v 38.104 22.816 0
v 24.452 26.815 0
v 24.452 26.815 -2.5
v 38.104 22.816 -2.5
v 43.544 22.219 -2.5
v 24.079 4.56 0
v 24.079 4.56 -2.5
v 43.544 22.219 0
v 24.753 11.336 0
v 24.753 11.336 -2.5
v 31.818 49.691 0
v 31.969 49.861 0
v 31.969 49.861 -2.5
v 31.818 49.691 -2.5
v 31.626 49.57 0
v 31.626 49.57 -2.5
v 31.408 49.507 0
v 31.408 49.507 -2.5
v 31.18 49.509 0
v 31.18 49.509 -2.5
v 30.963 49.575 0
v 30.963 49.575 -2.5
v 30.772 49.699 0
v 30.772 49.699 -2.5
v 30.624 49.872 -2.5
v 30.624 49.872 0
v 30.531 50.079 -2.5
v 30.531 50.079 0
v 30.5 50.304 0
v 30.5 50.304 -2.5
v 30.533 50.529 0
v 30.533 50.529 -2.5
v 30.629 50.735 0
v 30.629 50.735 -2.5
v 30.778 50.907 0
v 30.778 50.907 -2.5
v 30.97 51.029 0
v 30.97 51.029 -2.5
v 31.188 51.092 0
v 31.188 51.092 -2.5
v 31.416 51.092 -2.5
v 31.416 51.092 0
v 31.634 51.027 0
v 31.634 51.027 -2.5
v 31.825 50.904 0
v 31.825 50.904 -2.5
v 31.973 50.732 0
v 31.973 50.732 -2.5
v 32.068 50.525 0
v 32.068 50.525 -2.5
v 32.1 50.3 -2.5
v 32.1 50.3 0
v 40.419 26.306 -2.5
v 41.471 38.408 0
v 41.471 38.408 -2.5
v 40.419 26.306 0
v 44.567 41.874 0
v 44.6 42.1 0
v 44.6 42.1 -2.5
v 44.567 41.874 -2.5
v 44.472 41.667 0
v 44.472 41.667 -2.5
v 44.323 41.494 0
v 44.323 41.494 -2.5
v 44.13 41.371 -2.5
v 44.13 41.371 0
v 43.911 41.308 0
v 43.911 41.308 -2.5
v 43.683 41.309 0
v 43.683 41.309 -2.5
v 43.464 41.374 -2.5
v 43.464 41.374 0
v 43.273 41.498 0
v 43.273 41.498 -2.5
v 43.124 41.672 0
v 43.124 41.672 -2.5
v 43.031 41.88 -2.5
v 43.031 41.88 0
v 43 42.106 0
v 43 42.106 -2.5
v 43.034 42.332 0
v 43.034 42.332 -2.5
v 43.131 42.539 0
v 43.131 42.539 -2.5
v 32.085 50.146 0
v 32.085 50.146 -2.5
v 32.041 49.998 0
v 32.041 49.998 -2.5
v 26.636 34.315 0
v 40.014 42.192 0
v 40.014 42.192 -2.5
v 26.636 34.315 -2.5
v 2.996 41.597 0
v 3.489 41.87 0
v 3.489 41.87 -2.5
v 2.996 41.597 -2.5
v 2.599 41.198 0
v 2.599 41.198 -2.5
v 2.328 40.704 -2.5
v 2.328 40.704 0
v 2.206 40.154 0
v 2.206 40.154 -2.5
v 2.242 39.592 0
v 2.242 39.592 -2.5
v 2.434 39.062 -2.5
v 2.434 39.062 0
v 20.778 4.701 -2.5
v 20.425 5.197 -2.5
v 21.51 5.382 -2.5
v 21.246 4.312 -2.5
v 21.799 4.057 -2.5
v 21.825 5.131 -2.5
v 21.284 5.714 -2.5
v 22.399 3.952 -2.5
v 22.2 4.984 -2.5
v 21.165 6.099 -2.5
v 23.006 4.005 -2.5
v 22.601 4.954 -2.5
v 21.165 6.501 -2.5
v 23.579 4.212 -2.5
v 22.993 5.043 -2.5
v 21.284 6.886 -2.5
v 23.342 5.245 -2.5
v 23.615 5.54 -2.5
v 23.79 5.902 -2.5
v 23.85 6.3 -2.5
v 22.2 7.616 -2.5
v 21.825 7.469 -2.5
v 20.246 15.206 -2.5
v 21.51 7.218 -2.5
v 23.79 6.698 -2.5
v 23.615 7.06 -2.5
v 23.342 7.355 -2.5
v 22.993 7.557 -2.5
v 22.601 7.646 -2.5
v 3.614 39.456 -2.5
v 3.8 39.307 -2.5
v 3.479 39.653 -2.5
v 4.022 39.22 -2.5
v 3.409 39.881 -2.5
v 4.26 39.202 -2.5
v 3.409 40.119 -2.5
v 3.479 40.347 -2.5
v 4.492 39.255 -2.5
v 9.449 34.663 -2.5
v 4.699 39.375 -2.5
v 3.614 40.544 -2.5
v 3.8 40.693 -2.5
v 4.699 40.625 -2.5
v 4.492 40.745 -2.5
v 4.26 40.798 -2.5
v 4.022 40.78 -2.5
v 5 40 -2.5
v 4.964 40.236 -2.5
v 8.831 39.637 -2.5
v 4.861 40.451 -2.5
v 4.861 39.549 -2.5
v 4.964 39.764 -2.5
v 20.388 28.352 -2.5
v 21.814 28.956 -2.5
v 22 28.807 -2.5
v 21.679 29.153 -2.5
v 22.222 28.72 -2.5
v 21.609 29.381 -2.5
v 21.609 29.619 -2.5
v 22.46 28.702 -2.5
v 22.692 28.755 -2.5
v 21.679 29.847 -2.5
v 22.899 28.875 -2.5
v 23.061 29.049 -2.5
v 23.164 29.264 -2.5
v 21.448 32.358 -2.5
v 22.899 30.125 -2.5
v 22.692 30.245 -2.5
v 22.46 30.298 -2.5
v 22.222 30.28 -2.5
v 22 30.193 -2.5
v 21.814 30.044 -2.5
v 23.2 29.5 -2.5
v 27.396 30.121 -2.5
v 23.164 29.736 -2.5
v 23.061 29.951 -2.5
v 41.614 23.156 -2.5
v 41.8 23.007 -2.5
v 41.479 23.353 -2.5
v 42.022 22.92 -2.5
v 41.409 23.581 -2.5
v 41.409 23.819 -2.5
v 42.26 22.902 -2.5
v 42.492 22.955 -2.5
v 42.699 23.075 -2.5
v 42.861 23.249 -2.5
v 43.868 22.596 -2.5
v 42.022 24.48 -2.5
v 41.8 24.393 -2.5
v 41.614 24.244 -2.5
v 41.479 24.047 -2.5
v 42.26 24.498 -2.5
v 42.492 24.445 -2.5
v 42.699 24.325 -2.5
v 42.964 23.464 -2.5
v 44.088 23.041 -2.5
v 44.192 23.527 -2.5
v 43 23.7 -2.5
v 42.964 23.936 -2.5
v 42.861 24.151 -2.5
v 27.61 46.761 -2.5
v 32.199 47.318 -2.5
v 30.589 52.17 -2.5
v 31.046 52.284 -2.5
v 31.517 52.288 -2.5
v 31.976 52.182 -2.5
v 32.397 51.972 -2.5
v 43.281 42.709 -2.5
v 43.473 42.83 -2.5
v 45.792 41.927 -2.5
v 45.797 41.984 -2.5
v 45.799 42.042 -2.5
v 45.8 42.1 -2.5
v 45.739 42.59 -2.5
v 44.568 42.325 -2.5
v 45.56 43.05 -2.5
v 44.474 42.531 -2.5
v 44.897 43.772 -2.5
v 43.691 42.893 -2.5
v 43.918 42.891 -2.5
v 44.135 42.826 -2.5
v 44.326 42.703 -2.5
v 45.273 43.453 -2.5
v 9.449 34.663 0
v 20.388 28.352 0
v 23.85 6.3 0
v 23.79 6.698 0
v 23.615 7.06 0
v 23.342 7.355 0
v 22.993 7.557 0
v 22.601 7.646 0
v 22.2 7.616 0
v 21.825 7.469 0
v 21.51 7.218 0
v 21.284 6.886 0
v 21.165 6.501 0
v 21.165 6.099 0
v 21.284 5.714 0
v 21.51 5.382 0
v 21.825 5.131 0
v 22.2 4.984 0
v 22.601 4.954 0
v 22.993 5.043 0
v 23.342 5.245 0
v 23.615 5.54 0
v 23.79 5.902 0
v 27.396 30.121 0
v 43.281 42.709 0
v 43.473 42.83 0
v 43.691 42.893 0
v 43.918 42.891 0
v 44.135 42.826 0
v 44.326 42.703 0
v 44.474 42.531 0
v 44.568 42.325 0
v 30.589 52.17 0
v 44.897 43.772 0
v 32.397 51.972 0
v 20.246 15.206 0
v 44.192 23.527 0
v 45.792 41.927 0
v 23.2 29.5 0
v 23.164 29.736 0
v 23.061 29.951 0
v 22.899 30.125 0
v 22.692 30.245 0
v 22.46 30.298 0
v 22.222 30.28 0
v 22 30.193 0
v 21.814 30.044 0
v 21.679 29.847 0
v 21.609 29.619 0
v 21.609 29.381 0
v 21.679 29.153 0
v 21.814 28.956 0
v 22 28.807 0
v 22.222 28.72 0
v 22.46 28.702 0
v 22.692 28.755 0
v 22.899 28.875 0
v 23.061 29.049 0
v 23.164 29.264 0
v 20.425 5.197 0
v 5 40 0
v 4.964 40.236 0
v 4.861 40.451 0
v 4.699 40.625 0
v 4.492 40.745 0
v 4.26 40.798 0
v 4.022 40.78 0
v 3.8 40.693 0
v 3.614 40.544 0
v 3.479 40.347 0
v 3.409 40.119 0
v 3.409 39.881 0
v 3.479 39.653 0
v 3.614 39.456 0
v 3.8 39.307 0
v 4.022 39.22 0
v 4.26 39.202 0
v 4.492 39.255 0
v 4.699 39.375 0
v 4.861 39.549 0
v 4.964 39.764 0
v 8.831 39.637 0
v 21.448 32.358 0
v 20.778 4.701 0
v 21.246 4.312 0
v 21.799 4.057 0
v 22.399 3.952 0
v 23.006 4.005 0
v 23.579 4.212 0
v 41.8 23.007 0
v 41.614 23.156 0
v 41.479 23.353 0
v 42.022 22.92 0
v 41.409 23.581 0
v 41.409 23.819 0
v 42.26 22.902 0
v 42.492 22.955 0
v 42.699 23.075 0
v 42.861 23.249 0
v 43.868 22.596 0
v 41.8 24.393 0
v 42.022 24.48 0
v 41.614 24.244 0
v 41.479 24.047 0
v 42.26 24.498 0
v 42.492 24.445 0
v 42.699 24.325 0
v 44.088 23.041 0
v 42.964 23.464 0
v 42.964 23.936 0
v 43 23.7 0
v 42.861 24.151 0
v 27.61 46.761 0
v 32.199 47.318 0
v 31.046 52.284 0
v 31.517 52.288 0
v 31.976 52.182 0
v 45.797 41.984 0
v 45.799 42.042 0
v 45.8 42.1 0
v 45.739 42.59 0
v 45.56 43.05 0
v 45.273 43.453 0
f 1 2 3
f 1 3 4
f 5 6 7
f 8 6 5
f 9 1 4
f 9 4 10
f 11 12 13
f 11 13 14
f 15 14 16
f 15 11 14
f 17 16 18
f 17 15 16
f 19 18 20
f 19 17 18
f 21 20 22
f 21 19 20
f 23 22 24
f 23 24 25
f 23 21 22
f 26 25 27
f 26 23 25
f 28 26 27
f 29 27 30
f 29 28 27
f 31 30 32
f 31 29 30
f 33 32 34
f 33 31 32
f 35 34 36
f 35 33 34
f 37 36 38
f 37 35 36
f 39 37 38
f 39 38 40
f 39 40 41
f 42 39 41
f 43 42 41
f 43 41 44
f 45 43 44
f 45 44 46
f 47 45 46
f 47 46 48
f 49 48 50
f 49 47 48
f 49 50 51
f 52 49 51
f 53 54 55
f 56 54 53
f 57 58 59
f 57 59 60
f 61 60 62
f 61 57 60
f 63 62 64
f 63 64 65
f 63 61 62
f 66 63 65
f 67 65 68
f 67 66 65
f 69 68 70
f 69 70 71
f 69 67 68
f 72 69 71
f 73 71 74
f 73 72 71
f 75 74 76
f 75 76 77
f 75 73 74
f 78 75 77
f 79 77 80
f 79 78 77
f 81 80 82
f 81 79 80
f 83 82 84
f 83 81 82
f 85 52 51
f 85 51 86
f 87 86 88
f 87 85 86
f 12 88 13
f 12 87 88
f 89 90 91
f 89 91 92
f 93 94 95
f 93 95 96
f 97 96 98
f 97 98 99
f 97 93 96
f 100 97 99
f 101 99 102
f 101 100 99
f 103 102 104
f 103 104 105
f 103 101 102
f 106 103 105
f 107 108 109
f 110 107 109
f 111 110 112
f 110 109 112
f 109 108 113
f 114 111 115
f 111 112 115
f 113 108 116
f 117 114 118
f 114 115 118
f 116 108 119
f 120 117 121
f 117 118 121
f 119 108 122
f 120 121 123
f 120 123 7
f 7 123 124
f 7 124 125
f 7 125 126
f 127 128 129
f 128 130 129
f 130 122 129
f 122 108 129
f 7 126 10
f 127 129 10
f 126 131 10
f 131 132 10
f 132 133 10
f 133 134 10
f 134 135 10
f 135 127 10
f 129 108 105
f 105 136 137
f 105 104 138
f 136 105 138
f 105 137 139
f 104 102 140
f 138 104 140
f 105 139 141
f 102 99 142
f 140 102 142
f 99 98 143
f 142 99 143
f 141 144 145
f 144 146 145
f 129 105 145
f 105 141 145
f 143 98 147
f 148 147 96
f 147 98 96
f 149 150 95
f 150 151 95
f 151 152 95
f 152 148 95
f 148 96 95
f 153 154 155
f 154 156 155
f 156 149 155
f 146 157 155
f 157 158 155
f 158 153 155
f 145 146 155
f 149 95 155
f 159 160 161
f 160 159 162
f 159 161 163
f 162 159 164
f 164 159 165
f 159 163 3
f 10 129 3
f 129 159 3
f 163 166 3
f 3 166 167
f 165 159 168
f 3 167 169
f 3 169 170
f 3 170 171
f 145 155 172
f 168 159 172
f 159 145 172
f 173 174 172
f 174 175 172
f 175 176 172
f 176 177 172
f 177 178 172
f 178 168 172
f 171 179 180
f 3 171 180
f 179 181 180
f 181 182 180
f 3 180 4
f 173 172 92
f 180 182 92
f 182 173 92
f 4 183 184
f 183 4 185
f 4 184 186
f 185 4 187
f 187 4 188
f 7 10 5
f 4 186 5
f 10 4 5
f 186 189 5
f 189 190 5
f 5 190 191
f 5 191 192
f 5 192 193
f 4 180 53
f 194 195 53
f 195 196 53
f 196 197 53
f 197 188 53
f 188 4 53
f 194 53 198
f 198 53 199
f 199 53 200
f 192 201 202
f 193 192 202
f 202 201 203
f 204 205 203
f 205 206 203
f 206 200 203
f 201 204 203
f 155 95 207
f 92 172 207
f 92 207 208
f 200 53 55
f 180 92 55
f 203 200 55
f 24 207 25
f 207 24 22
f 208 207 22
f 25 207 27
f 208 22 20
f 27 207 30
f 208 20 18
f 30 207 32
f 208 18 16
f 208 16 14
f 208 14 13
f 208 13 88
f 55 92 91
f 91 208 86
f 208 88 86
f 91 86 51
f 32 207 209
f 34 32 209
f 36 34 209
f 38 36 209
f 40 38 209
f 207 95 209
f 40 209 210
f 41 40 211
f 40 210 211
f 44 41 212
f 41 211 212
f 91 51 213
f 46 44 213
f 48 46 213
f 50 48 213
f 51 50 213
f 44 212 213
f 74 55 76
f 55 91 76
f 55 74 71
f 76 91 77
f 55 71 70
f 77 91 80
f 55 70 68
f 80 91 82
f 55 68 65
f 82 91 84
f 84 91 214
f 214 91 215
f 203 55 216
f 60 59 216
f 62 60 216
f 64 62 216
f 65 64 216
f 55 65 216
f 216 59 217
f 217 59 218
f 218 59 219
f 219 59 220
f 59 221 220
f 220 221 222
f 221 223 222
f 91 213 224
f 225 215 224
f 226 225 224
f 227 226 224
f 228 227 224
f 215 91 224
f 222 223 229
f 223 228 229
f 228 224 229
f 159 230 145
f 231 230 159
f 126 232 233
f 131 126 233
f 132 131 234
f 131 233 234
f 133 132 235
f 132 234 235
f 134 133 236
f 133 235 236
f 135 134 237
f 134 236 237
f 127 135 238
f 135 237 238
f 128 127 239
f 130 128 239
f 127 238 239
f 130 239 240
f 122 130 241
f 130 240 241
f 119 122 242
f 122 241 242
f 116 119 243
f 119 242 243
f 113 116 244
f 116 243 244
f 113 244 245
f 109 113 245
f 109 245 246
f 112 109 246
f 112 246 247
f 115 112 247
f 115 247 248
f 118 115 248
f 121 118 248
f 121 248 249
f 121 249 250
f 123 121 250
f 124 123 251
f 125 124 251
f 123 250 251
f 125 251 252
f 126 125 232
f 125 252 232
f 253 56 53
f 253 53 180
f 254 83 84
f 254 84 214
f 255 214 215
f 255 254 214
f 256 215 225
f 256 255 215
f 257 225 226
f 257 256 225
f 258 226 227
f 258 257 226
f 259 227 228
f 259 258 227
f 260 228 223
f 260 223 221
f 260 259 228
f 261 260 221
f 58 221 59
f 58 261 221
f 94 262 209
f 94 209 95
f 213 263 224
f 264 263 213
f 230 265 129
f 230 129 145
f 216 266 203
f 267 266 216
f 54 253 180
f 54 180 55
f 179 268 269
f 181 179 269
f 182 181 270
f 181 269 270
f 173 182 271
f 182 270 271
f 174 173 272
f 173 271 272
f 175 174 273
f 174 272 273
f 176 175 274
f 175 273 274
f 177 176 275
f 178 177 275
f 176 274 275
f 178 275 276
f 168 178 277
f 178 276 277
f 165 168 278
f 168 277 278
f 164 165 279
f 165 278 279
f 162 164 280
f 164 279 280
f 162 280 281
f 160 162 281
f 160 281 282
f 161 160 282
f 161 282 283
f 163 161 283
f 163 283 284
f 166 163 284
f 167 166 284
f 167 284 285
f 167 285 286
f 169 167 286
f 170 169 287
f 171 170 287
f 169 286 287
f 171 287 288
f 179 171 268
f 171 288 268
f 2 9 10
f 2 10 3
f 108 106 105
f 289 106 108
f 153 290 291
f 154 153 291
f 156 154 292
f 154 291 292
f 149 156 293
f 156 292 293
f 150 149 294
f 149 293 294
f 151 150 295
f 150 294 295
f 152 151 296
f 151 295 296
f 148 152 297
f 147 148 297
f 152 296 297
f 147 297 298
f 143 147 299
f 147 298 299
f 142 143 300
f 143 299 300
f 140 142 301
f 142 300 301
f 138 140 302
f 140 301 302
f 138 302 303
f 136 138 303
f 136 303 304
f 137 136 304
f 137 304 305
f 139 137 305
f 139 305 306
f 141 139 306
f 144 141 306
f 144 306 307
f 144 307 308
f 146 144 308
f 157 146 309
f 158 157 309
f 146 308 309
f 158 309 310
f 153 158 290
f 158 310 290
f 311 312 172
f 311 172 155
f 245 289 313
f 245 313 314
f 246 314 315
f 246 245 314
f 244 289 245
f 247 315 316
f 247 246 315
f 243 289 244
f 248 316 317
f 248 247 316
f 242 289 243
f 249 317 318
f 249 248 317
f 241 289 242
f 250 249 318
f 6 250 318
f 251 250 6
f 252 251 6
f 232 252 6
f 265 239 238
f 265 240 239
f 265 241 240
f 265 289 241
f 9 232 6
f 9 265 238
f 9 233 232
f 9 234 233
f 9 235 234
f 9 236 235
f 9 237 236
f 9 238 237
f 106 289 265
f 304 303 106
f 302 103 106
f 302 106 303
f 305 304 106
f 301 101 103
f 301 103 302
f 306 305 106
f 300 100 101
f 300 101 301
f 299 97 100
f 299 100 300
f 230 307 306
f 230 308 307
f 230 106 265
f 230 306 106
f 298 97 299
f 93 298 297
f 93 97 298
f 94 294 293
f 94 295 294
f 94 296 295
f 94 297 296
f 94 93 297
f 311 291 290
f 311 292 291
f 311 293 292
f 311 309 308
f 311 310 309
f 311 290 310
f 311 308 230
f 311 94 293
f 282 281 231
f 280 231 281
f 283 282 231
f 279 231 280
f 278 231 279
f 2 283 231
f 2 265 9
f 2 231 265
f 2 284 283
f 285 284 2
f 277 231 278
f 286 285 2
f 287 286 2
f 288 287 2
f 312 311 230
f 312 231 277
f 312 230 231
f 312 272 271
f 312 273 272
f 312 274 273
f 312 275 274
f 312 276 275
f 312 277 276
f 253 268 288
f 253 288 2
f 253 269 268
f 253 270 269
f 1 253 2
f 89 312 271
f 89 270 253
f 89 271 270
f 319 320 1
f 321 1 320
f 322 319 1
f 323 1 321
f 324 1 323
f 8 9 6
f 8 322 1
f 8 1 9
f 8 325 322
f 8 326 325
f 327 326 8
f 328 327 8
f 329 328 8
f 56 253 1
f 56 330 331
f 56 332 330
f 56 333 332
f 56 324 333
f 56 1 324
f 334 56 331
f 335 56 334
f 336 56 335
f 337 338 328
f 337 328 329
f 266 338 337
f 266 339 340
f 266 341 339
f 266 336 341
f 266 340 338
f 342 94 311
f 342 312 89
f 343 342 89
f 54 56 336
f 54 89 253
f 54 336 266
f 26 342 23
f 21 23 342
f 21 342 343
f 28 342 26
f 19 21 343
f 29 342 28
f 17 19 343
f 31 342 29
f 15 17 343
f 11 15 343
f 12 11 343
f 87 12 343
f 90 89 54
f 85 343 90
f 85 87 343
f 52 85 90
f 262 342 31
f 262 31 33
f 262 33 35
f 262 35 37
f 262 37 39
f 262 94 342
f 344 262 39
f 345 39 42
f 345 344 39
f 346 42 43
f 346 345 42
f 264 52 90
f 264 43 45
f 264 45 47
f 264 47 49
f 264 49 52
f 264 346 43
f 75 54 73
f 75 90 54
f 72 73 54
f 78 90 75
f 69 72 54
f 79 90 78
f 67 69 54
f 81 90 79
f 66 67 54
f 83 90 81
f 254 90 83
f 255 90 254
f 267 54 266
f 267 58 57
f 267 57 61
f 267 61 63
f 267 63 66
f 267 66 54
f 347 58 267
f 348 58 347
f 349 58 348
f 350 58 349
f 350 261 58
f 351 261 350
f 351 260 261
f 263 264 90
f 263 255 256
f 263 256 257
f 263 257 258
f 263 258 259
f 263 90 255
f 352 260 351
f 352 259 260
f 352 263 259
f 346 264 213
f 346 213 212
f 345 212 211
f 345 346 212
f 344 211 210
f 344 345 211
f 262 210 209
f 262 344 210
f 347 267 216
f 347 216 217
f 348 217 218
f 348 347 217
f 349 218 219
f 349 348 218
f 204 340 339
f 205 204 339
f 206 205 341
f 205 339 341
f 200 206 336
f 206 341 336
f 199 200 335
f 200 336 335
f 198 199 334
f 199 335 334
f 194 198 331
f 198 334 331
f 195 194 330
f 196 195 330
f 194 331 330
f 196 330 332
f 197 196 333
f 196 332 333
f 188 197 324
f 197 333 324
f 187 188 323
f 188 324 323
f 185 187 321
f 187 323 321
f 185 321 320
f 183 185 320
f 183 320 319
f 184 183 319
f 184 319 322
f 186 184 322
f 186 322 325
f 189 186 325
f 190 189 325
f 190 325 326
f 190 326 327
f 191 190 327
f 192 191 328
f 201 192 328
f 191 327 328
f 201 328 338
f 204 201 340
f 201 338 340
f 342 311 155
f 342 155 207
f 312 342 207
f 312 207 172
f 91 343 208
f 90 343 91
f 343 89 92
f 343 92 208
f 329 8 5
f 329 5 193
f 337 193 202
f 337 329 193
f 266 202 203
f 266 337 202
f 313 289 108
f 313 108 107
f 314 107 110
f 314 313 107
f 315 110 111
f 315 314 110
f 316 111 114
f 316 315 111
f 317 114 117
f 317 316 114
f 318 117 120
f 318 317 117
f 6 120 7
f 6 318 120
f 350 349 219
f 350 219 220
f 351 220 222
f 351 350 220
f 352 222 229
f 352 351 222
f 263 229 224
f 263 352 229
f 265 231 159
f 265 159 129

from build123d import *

# Parameters (mm, degrees)
F1_R     = 0.8
F1_R_2   = 1.35
F2_DEPTH = 2.5


# Not quite as in the source:
# - a feature of the source that left no trace in its solid (it failed there, or was rolled back) is left out


with BuildPart() as f2:
    # F1 (on Top) → F2 (new body)
    with BuildSketch(Plane.XY):
        with BuildLine():
            ThreePointArc((5.199444907, 41.7323711721), (4.3598959993, 41.9935980712), (3.4894439174, 41.8695213434))
            ThreePointArc((3.4894439174, 41.8695213434), (2.3279381226, 40.7038354404), (2.4337804668, 39.0616671377))
            ThreePointArc((2.4337804668, 39.0616671377), (2.7613029651, 38.610701313), (3.200555093, 38.2676288279))
            ThreePointArc((3.200555093, 38.2676288279), (4.1741960688, 38.0001664676), (5.1544139045, 38.2424181103))
            ThreePointArc((5.1544139045, 38.2424181103), (5.9188408607, 38.9774609565), (6.2, 40))
            ThreePointArc((6.2, 40), (6.1361812507, 40.5012007226), (5.9487978357, 40.9704154419))
            ThreePointArc((5.9487978357, 40.9704154419), (5.625957109, 41.402371678), (5.199444907, 41.7323711721))
        make_face()
        with Locations((4.2, 40)):
            Circle(F1_R, mode=Mode.SUBTRACT)
        with BuildLine():
            Line((27.6104340169, 46.7612620152), (29.4612530015, 51.0867715523))
            ThreePointArc((29.4612530015, 51.0867715523), (29.9151450158, 51.7429749383), (30.5894439174, 52.1695213434))
            Line((30.5894439174, 52.1695213434), (3.4894439174, 41.8695213434))
            ThreePointArc((3.4894439174, 41.8695213434), (4.3598959993, 41.9935980712), (5.199444907, 41.7323711721))
            Line((5.199444907, 41.7323711721), (8.8310911779, 39.6371906312))
            Line((8.8310911779, 39.6371906312), (27.6104340169, 46.7612620152))
        make_face()
        with BuildLine():
            ThreePointArc((32.009384409, 48.4300337542), (32.5519790638, 48.74033708), (32.972287567, 49.202979356))
            ThreePointArc((32.972287567, 49.202979356), (33.0623576694, 49.3544337965), (33.1387469985, 49.5132284477))
            ThreePointArc((33.1387469985, 49.5132284477), (33.2592720583, 49.8984368026), (33.3, 50.3))
            ThreePointArc((33.3, 50.3), (33.0598354025, 51.2502522592), (32.397020644, 51.972287567))
            ThreePointArc((32.397020644, 51.972287567), (31.5169424001, 52.2881991839), (30.5894439174, 52.1695213434))
            ThreePointArc((30.5894439174, 52.1695213434), (29.9151450158, 51.7429749383), (29.4612530015, 51.0867715523))
            ThreePointArc((29.4612530015, 51.0867715523), (29.3852086666, 49.7224412157), (30.202979356, 48.627712433))
            ThreePointArc((30.202979356, 48.627712433), (31.0824346588, 48.311868887), (32.009384409, 48.4300337542))
        make_face()
        with BuildLine():
            ThreePointArc((31.9689150268, 49.8611917424), (30.5334714547, 50.5289846922), (32.1, 50.3))
            ThreePointArc((32.1, 50.3), (32.0665285453, 50.0710153078), (31.9689150268, 49.8611917424))
        make_face(mode=Mode.SUBTRACT)
        with BuildLine():
            ThreePointArc((20.1501364504, 6.325323864), (20.2166788322, 5.7441722888), (20.4246920484, 5.1974588868))
            ThreePointArc((20.4246920484, 5.1974588868), (22.0958795292, 3.985008284), (24.0790139172, 4.5595359673))
            ThreePointArc((24.0790139172, 4.5595359673), (24.6486254566, 5.3482076659), (24.85, 6.3))
            ThreePointArc((24.85, 6.3), (24.8498894798, 6.3227910674), (24.8495579296, 6.3455799911))
            ThreePointArc((24.8495579296, 6.3455799911), (24.7691945263, 6.9109469713), (24.5548374569, 7.4402381443))
            ThreePointArc((24.5548374569, 7.4402381443), (22.9138153936, 8.6132783706), (20.9678942394, 8.0818956025))
            ThreePointArc((20.9678942394, 8.0818956025), (20.3695522772, 7.2918127346), (20.1501364504, 6.325323864))
        make_face()
        with Locations((22.5, 6.3)):
            Circle(F1_R_2, mode=Mode.SUBTRACT)
        with BuildLine():
            ThreePointArc((44.2, 23.7), (43.800697674, 24.8990692042), (42.7622330434, 25.6193472862))
            ThreePointArc((42.7622330434, 25.6193472862), (41.7779870797, 25.6549693336), (40.8960802037, 25.2165068958))
            ThreePointArc((40.8960802037, 25.2165068958), (40.4202125368, 24.6123357857), (40.2075188236, 23.8732592327))
            ThreePointArc((40.2075188236, 23.8732592327), (40.548821119, 22.571457443), (41.6377669566, 21.7806527138))
            ThreePointArc((41.6377669566, 21.7806527138), (42.6480080175, 21.7508235544), (43.5438416317, 22.2187540147))
            ThreePointArc((43.5438416317, 22.2187540147), (43.991778392, 22.8114448842), (44.1924811764, 23.5267407673))
            ThreePointArc((44.1924811764, 23.5267407673), (44.1981194099, 23.6132888496), (44.2, 23.7))
        make_face()
        with Locations((42.2, 23.7)):
            Circle(F1_R, mode=Mode.SUBTRACT)
        with BuildLine():
            ThreePointArc((42.7852559244, 43.8234542237), (42.4204567714, 43.5480540323), (42.127712433, 43.197020644))
            ThreePointArc((42.127712433, 43.197020644), (41.9102999519, 42.7550066627), (41.8075188236, 42.2732592327))
            ThreePointArc((41.8075188236, 42.2732592327), (42.0006206287, 41.2269399345), (42.702979356, 40.427712433))
            ThreePointArc((42.702979356, 40.427712433), (43.7515555461, 40.1005868024), (44.8147440756, 40.3765457763))
            ThreePointArc((44.8147440756, 40.3765457763), (45.4916344335, 41.0330543859), (45.7924811764, 41.9267407673))
            ThreePointArc((45.7924811764, 41.9267407673), (45.7981194099, 42.0132888496), (45.8, 42.1))
            ThreePointArc((45.8, 42.1), (45.5598354025, 43.0502522592), (44.897020644, 43.772287567))
            ThreePointArc((44.897020644, 43.772287567), (43.8484444539, 44.0994131976), (42.7852559244, 43.8234542237))
        make_face()
        with BuildLine():
            ThreePointArc((44.6, 42.1), (43.5710153078, 41.3334714547), (43.1310849732, 42.5388082576))
            ThreePointArc((43.1310849732, 42.5388082576), (44.0289846922, 42.8665285453), (44.6, 42.1))
        make_face(mode=Mode.SUBTRACT)
        with BuildLine():
            ThreePointArc((22.9622330434, 31.4193472862), (22.1534536929, 31.4847455551), (21.3852559244, 31.2234542237))
            ThreePointArc((21.3852559244, 31.2234542237), (20.8983520938, 30.8210047561), (20.5612530015, 30.2867715523))
            ThreePointArc((20.5612530015, 30.2867715523), (20.4429200591, 29.9121141894), (20.400116128, 29.5215522247))
            ThreePointArc((20.400116128, 29.5215522247), (20.6627449521, 28.5090686712), (21.400555093, 27.7676288279))
            ThreePointArc((21.400555093, 27.7676288279), (21.6135843834, 27.6611007428), (21.8377669566, 27.5806527138))
            ThreePointArc((21.8377669566, 27.5806527138), (22.6465463071, 27.5152544449), (23.4147440756, 27.7765457763))
            ThreePointArc((23.4147440756, 27.7765457763), (23.9016479062, 28.1789952439), (24.2387469985, 28.7132284477))
            ThreePointArc((24.2387469985, 28.7132284477), (24.3592720583, 29.0984368026), (24.4, 29.5))
            ThreePointArc((24.4, 29.5), (24.3999059403, 29.5193966531), (24.3996237698, 29.5387914818))
            ThreePointArc((24.3996237698, 29.5387914818), (24.1221080901, 30.5170269053), (23.399444907, 31.2323711721))
            ThreePointArc((23.399444907, 31.2323711721), (23.1864156166, 31.3388992572), (22.9622330434, 31.4193472862))
        make_face()
        with Locations((22.4, 29.5)):
            Circle(F1_R, mode=Mode.SUBTRACT)
        with BuildLine():
            Line((41.6377669566, 21.7806527138), (38.1039741935, 22.8158041293))
            Line((38.1039741935, 22.8158041293), (24.7527433965, 11.336176711))
            Line((24.7527433965, 11.336176711), (24.8495579296, 6.3455799911))
            ThreePointArc((24.8495579296, 6.3455799911), (24.8498894798, 6.3227910674), (24.85, 6.3))
            ThreePointArc((24.85, 6.3), (24.6486254566, 5.3482076659), (24.0790139172, 4.5595359673))
            Line((24.0790139172, 4.5595359673), (43.5438416317, 22.2187540147))
            ThreePointArc((43.5438416317, 22.2187540147), (42.6480080175, 21.7508235544), (41.6377669566, 21.7806527138))
        make_face()
        with BuildLine():
            Line((44.8147440756, 40.3765457763), (41.4714130157, 38.408042442))
            Line((41.4714130157, 38.408042442), (40.4190386777, 26.3057375549))
            Line((40.4190386777, 26.3057375549), (42.7622330434, 25.6193472862))
            ThreePointArc((42.7622330434, 25.6193472862), (43.800697674, 24.8990692042), (44.2, 23.7))
            ThreePointArc((44.2, 23.7), (44.1981194099, 23.6132888496), (44.1924811764, 23.5267407673))
            Line((44.1924811764, 23.5267407673), (45.7924811764, 41.9267407673))
            ThreePointArc((45.7924811764, 41.9267407673), (45.4916344335, 41.0330543859), (44.8147440756, 40.3765457763))
        make_face()
        with BuildLine():
            Line((24.8495579296, 6.3455799911), (24.7527433965, 11.336176711))
            Line((24.7527433965, 11.336176711), (23.1551857529, 9.9625680299))
            Line((23.1551857529, 9.9625680299), (24.5548374569, 7.4402381443))
            ThreePointArc((24.5548374569, 7.4402381443), (24.7691945263, 6.9109469713), (24.8495579296, 6.3455799911))
        make_face()
        with BuildLine():
            Line((24.5548374569, 7.4402381443), (23.1551857529, 9.9625680299))
            Line((23.1551857529, 9.9625680299), (20.9678942394, 8.0818956025))
            ThreePointArc((20.9678942394, 8.0818956025), (22.9138153936, 8.6132783706), (24.5548374569, 7.4402381443))
        make_face()
        with BuildLine():
            Line((40.2075188236, 23.8732592327), (40.2781200828, 24.6851737134))
            Line((40.2781200828, 24.6851737134), (38.1039741935, 22.8158041293))
            Line((38.1039741935, 22.8158041293), (41.6377669566, 21.7806527138))
            ThreePointArc((41.6377669566, 21.7806527138), (40.548821119, 22.571457443), (40.2075188236, 23.8732592327))
        make_face()
        with BuildLine():
            Line((42.7622330434, 25.6193472862), (40.4190386777, 26.3057375549))
            Line((40.4190386777, 26.3057375549), (40.2781200828, 24.6851737134))
            Line((40.2781200828, 24.6851737134), (40.8960802037, 25.2165068958))
            ThreePointArc((40.8960802037, 25.2165068958), (41.7779870797, 25.6549693336), (42.7622330434, 25.6193472862))
        make_face()
        with BuildLine():
            Line((42.702979356, 40.427712433), (41.7040205766, 41.0830293923))
            Line((41.7040205766, 41.0830293923), (41.4714130157, 38.408042442))
            Line((41.4714130157, 38.408042442), (44.8147440756, 40.3765457763))
            ThreePointArc((44.8147440756, 40.3765457763), (43.7515555461, 40.1005868024), (42.702979356, 40.427712433))
        make_face()
        with BuildLine():
            ThreePointArc((42.702979356, 40.427712433), (42.0006206287, 41.2269399345), (41.8075188236, 42.2732592327))
            Line((41.8075188236, 42.2732592327), (41.7040205766, 41.0830293923))
            Line((41.7040205766, 41.0830293923), (42.702979356, 40.427712433))
        make_face()
        with BuildLine():
            Line((40.8960802037, 25.2165068958), (40.2781200828, 24.6851737134))
            Line((40.2781200828, 24.6851737134), (40.2075188236, 23.8732592327))
            ThreePointArc((40.2075188236, 23.8732592327), (40.4202125368, 24.6123357857), (40.8960802037, 25.2165068958))
        make_face()
        with BuildLine():
            ThreePointArc((3.200555093, 38.2676288279), (2.7613029651, 38.610701313), (2.4337804668, 39.0616671377))
            Line((2.4337804668, 39.0616671377), (20.4246920484, 5.1974588868))
            ThreePointArc((20.4246920484, 5.1974588868), (20.2166788322, 5.7441722888), (20.1501364504, 6.325323864))
            Line((20.1501364504, 6.325323864), (20.2458362488, 15.2055432508))
            Line((20.2458362488, 15.2055432508), (9.4489187614, 34.6628036346))
            Line((9.4489187614, 34.6628036346), (3.200555093, 38.2676288279))
        make_face()
        with BuildLine():
            Line((23.1551857529, 9.9625680299), (20.2458362488, 15.2055432508))
            Line((20.2458362488, 15.2055432508), (20.1501364504, 6.325323864))
            ThreePointArc((20.1501364504, 6.325323864), (20.3695522772, 7.2918127346), (20.9678942394, 8.0818956025))
            Line((20.9678942394, 8.0818956025), (23.1551857529, 9.9625680299))
        make_face()
        with BuildLine():
            Line((24.7527433965, 11.336176711), (24.452468903, 26.8147299215))
            Line((24.452468903, 26.8147299215), (21.8377669566, 27.5806527138))
            ThreePointArc((21.8377669566, 27.5806527138), (21.6135843834, 27.6611007428), (21.400555093, 27.7676288279))
            Line((21.400555093, 27.7676288279), (20.3875129911, 28.3520761944))
            Line((20.3875129911, 28.3520761944), (20.2458362488, 15.2055432508))
            Line((20.2458362488, 15.2055432508), (23.1551857529, 9.9625680299))
            Line((23.1551857529, 9.9625680299), (24.7527433965, 11.336176711))
        make_face()
        with BuildLine():
            Line((33.1387469985, 49.5132284477), (32.9986081891, 49.185713028))
            Line((32.9986081891, 49.185713028), (41.9354850239, 43.3231218243))
            Line((41.9354850239, 43.3231218243), (42.7852559244, 43.8234542237))
            ThreePointArc((42.7852559244, 43.8234542237), (43.8484444539, 44.0994131976), (44.897020644, 43.772287567))
            Line((44.897020644, 43.772287567), (32.397020644, 51.972287567))
            ThreePointArc((32.397020644, 51.972287567), (33.0598354025, 51.2502522592), (33.3, 50.3))
            ThreePointArc((33.3, 50.3), (33.2592720583, 49.8984368026), (33.1387469985, 49.5132284477))
        make_face()
        Polygon((41.9354850239, 43.3231218243), (32.9986081891, 49.185713028), (32.1994534098, 47.3180254538), (40.0139218466, 42.1917341592), align=None)
        with BuildLine():
            Line((42.127712433, 43.197020644), (41.9354850239, 43.3231218243))
            Line((41.9354850239, 43.3231218243), (40.0139218466, 42.1917341592))
            Line((40.0139218466, 42.1917341592), (41.7040205766, 41.0830293923))
            Line((41.7040205766, 41.0830293923), (41.8075188236, 42.2732592327))
            ThreePointArc((41.8075188236, 42.2732592327), (41.9102999519, 42.7550066627), (42.127712433, 43.197020644))
        make_face()
        with BuildLine():
            Line((42.7852559244, 43.8234542237), (41.9354850239, 43.3231218243))
            Line((41.9354850239, 43.3231218243), (42.127712433, 43.197020644))
            ThreePointArc((42.127712433, 43.197020644), (42.4204567714, 43.5480540323), (42.7852559244, 43.8234542237))
        make_face()
        with BuildLine():
            Line((32.9986081891, 49.185713028), (32.972287567, 49.202979356))
            ThreePointArc((32.972287567, 49.202979356), (32.5519790638, 48.74033708), (32.009384409, 48.4300337542))
            Line((32.009384409, 48.4300337542), (31.0557778484, 48.068276622))
            Line((31.0557778484, 48.068276622), (32.1994534098, 47.3180254538))
            Line((32.1994534098, 47.3180254538), (32.9986081891, 49.185713028))
        make_face()
        with BuildLine():
            ThreePointArc((33.1387469985, 49.5132284477), (33.0623576694, 49.3544337965), (32.972287567, 49.202979356))
            Line((32.972287567, 49.202979356), (32.9986081891, 49.185713028))
            Line((32.9986081891, 49.185713028), (33.1387469985, 49.5132284477))
        make_face()
        with BuildLine():
            Line((31.0557778484, 48.068276622), (32.009384409, 48.4300337542))
            ThreePointArc((32.009384409, 48.4300337542), (31.0824346588, 48.311868887), (30.202979356, 48.627712433))
            Line((30.202979356, 48.627712433), (31.0557778484, 48.068276622))
        make_face()
        with BuildLine():
            Line((31.0557778484, 48.068276622), (30.202979356, 48.627712433))
            ThreePointArc((30.202979356, 48.627712433), (29.3852086666, 49.7224412157), (29.4612530015, 51.0867715523))
            Line((29.4612530015, 51.0867715523), (27.6104340169, 46.7612620152))
            Line((27.6104340169, 46.7612620152), (31.0557778484, 48.068276622))
        make_face()
        with BuildLine():
            Line((7.0611867859, 38.9657653668), (8.8310911779, 39.6371906312))
            Line((8.8310911779, 39.6371906312), (5.199444907, 41.7323711721))
            ThreePointArc((5.199444907, 41.7323711721), (5.625957109, 41.402371678), (5.9487978357, 40.9704154419))
            Line((5.9487978357, 40.9704154419), (7.0611867859, 38.9657653668))
        make_face()
        with BuildLine():
            Line((5.1544139045, 38.2424181103), (7.0611867859, 38.9657653668))
            Line((7.0611867859, 38.9657653668), (5.9487978357, 40.9704154419))
            ThreePointArc((5.9487978357, 40.9704154419), (6.1361812507, 40.5012007226), (6.2, 40))
            ThreePointArc((6.2, 40), (5.9188408607, 38.9774609565), (5.1544139045, 38.2424181103))
        make_face()
        with BuildLine():
            Line((9.4489187614, 34.6628036346), (7.0611867859, 38.9657653668))
            Line((7.0611867859, 38.9657653668), (5.1544139045, 38.2424181103))
            ThreePointArc((5.1544139045, 38.2424181103), (4.1741960688, 38.0001664676), (3.200555093, 38.2676288279))
            Line((3.200555093, 38.2676288279), (9.4489187614, 34.6628036346))
        make_face()
        with BuildLine():
            Line((20.5612530015, 30.2867715523), (21.4476690943, 32.3583956794))
            Line((21.4476690943, 32.3583956794), (8.8310911779, 39.6371906312))
            Line((8.8310911779, 39.6371906312), (7.0611867859, 38.9657653668))
            Line((7.0611867859, 38.9657653668), (9.4489187614, 34.6628036346))
            Line((9.4489187614, 34.6628036346), (20.3875129911, 28.3520761944))
            Line((20.3875129911, 28.3520761944), (20.400116128, 29.5215522247))
            ThreePointArc((20.400116128, 29.5215522247), (20.4429200591, 29.9121141894), (20.5612530015, 30.2867715523))
        make_face()
        with BuildLine():
            Line((21.3852559244, 31.2234542237), (22.3897518441, 31.8148864007))
            Line((22.3897518441, 31.8148864007), (21.4476690943, 32.3583956794))
            Line((21.4476690943, 32.3583956794), (20.5612530015, 30.2867715523))
            ThreePointArc((20.5612530015, 30.2867715523), (20.8983520938, 30.8210047561), (21.3852559244, 31.2234542237))
        make_face()
        Polygon((26.6355518827, 34.3147499748), (32.1994534098, 47.3180254538), (31.0557778484, 48.068276622), (27.6104340169, 46.7612620152), (21.4476690943, 32.3583956794), (22.3897518441, 31.8148864007), align=None)
        Polygon((25.1255087716, 30.7856604567), (26.6355518827, 34.3147499748), (22.3897518441, 31.8148864007), (23.1920320855, 31.3520324152), align=None)
        Polygon((40.4190386777, 26.3057375549), (27.3959062448, 30.1205945302), (24.4223018654, 28.3697807367), (24.452468903, 26.8147299215), (38.1039741935, 22.8158041293), (40.2781200828, 24.6851737134), align=None)
        Polygon((27.3959062448, 30.1205945302), (25.1255087716, 30.7856604567), (24.4079671049, 29.1087091458), (24.4223018654, 28.3697807367), align=None)
        with BuildLine():
            ThreePointArc((21.400555093, 27.7676288279), (20.6627449521, 28.5090686712), (20.400116128, 29.5215522247))
            Line((20.400116128, 29.5215522247), (20.3875129911, 28.3520761944))
            Line((20.3875129911, 28.3520761944), (21.400555093, 27.7676288279))
        make_face()
        with BuildLine():
            Line((24.452468903, 26.8147299215), (24.4223018654, 28.3697807367))
            Line((24.4223018654, 28.3697807367), (23.4147440756, 27.7765457763))
            ThreePointArc((23.4147440756, 27.7765457763), (22.6465463071, 27.5152544449), (21.8377669566, 27.5806527138))
            Line((21.8377669566, 27.5806527138), (24.452468903, 26.8147299215))
        make_face()
        with BuildLine():
            Line((24.4223018654, 28.3697807367), (24.4079671049, 29.1087091458))
            Line((24.4079671049, 29.1087091458), (24.2387469985, 28.7132284477))
            ThreePointArc((24.2387469985, 28.7132284477), (23.9016479062, 28.1789952439), (23.4147440756, 27.7765457763))
            Line((23.4147440756, 27.7765457763), (24.4223018654, 28.3697807367))
        make_face()
        with BuildLine():
            Line((24.2387469985, 28.7132284477), (24.4079671049, 29.1087091458))
            Line((24.4079671049, 29.1087091458), (24.3996237698, 29.5387914818))
            ThreePointArc((24.3996237698, 29.5387914818), (24.3999059403, 29.5193966531), (24.4, 29.5))
            ThreePointArc((24.4, 29.5), (24.3592720583, 29.0984368026), (24.2387469985, 28.7132284477))
        make_face()
        with BuildLine():
            Line((24.4079671049, 29.1087091458), (25.1255087716, 30.7856604567))
            Line((25.1255087716, 30.7856604567), (23.1920320855, 31.3520324152))
            Line((23.1920320855, 31.3520324152), (23.399444907, 31.2323711721))
            ThreePointArc((23.399444907, 31.2323711721), (24.1221080901, 30.5170269053), (24.3996237698, 29.5387914818))
            Line((24.3996237698, 29.5387914818), (24.4079671049, 29.1087091458))
        make_face()
        with BuildLine():
            Line((23.1920320855, 31.3520324152), (22.3897518441, 31.8148864007))
            Line((22.3897518441, 31.8148864007), (21.3852559244, 31.2234542237))
            ThreePointArc((21.3852559244, 31.2234542237), (22.1534536929, 31.4847455551), (22.9622330434, 31.4193472862))
            Line((22.9622330434, 31.4193472862), (23.1920320855, 31.3520324152))
        make_face()
        with BuildLine():
            Line((23.399444907, 31.2323711721), (23.1920320855, 31.3520324152))
            Line((23.1920320855, 31.3520324152), (22.9622330434, 31.4193472862))
            ThreePointArc((22.9622330434, 31.4193472862), (23.1864156166, 31.3388992572), (23.399444907, 31.2323711721))
        make_face()
        Polygon((41.7040205766, 41.0830293923), (40.0139218466, 42.1917341592), (26.6355518827, 34.3147499748), (25.1255087716, 30.7856604567), (27.3959062448, 30.1205945302), (41.4714130157, 38.408042442), align=None)
    extrude(amount=-F2_DEPTH)


solid = f2.part
